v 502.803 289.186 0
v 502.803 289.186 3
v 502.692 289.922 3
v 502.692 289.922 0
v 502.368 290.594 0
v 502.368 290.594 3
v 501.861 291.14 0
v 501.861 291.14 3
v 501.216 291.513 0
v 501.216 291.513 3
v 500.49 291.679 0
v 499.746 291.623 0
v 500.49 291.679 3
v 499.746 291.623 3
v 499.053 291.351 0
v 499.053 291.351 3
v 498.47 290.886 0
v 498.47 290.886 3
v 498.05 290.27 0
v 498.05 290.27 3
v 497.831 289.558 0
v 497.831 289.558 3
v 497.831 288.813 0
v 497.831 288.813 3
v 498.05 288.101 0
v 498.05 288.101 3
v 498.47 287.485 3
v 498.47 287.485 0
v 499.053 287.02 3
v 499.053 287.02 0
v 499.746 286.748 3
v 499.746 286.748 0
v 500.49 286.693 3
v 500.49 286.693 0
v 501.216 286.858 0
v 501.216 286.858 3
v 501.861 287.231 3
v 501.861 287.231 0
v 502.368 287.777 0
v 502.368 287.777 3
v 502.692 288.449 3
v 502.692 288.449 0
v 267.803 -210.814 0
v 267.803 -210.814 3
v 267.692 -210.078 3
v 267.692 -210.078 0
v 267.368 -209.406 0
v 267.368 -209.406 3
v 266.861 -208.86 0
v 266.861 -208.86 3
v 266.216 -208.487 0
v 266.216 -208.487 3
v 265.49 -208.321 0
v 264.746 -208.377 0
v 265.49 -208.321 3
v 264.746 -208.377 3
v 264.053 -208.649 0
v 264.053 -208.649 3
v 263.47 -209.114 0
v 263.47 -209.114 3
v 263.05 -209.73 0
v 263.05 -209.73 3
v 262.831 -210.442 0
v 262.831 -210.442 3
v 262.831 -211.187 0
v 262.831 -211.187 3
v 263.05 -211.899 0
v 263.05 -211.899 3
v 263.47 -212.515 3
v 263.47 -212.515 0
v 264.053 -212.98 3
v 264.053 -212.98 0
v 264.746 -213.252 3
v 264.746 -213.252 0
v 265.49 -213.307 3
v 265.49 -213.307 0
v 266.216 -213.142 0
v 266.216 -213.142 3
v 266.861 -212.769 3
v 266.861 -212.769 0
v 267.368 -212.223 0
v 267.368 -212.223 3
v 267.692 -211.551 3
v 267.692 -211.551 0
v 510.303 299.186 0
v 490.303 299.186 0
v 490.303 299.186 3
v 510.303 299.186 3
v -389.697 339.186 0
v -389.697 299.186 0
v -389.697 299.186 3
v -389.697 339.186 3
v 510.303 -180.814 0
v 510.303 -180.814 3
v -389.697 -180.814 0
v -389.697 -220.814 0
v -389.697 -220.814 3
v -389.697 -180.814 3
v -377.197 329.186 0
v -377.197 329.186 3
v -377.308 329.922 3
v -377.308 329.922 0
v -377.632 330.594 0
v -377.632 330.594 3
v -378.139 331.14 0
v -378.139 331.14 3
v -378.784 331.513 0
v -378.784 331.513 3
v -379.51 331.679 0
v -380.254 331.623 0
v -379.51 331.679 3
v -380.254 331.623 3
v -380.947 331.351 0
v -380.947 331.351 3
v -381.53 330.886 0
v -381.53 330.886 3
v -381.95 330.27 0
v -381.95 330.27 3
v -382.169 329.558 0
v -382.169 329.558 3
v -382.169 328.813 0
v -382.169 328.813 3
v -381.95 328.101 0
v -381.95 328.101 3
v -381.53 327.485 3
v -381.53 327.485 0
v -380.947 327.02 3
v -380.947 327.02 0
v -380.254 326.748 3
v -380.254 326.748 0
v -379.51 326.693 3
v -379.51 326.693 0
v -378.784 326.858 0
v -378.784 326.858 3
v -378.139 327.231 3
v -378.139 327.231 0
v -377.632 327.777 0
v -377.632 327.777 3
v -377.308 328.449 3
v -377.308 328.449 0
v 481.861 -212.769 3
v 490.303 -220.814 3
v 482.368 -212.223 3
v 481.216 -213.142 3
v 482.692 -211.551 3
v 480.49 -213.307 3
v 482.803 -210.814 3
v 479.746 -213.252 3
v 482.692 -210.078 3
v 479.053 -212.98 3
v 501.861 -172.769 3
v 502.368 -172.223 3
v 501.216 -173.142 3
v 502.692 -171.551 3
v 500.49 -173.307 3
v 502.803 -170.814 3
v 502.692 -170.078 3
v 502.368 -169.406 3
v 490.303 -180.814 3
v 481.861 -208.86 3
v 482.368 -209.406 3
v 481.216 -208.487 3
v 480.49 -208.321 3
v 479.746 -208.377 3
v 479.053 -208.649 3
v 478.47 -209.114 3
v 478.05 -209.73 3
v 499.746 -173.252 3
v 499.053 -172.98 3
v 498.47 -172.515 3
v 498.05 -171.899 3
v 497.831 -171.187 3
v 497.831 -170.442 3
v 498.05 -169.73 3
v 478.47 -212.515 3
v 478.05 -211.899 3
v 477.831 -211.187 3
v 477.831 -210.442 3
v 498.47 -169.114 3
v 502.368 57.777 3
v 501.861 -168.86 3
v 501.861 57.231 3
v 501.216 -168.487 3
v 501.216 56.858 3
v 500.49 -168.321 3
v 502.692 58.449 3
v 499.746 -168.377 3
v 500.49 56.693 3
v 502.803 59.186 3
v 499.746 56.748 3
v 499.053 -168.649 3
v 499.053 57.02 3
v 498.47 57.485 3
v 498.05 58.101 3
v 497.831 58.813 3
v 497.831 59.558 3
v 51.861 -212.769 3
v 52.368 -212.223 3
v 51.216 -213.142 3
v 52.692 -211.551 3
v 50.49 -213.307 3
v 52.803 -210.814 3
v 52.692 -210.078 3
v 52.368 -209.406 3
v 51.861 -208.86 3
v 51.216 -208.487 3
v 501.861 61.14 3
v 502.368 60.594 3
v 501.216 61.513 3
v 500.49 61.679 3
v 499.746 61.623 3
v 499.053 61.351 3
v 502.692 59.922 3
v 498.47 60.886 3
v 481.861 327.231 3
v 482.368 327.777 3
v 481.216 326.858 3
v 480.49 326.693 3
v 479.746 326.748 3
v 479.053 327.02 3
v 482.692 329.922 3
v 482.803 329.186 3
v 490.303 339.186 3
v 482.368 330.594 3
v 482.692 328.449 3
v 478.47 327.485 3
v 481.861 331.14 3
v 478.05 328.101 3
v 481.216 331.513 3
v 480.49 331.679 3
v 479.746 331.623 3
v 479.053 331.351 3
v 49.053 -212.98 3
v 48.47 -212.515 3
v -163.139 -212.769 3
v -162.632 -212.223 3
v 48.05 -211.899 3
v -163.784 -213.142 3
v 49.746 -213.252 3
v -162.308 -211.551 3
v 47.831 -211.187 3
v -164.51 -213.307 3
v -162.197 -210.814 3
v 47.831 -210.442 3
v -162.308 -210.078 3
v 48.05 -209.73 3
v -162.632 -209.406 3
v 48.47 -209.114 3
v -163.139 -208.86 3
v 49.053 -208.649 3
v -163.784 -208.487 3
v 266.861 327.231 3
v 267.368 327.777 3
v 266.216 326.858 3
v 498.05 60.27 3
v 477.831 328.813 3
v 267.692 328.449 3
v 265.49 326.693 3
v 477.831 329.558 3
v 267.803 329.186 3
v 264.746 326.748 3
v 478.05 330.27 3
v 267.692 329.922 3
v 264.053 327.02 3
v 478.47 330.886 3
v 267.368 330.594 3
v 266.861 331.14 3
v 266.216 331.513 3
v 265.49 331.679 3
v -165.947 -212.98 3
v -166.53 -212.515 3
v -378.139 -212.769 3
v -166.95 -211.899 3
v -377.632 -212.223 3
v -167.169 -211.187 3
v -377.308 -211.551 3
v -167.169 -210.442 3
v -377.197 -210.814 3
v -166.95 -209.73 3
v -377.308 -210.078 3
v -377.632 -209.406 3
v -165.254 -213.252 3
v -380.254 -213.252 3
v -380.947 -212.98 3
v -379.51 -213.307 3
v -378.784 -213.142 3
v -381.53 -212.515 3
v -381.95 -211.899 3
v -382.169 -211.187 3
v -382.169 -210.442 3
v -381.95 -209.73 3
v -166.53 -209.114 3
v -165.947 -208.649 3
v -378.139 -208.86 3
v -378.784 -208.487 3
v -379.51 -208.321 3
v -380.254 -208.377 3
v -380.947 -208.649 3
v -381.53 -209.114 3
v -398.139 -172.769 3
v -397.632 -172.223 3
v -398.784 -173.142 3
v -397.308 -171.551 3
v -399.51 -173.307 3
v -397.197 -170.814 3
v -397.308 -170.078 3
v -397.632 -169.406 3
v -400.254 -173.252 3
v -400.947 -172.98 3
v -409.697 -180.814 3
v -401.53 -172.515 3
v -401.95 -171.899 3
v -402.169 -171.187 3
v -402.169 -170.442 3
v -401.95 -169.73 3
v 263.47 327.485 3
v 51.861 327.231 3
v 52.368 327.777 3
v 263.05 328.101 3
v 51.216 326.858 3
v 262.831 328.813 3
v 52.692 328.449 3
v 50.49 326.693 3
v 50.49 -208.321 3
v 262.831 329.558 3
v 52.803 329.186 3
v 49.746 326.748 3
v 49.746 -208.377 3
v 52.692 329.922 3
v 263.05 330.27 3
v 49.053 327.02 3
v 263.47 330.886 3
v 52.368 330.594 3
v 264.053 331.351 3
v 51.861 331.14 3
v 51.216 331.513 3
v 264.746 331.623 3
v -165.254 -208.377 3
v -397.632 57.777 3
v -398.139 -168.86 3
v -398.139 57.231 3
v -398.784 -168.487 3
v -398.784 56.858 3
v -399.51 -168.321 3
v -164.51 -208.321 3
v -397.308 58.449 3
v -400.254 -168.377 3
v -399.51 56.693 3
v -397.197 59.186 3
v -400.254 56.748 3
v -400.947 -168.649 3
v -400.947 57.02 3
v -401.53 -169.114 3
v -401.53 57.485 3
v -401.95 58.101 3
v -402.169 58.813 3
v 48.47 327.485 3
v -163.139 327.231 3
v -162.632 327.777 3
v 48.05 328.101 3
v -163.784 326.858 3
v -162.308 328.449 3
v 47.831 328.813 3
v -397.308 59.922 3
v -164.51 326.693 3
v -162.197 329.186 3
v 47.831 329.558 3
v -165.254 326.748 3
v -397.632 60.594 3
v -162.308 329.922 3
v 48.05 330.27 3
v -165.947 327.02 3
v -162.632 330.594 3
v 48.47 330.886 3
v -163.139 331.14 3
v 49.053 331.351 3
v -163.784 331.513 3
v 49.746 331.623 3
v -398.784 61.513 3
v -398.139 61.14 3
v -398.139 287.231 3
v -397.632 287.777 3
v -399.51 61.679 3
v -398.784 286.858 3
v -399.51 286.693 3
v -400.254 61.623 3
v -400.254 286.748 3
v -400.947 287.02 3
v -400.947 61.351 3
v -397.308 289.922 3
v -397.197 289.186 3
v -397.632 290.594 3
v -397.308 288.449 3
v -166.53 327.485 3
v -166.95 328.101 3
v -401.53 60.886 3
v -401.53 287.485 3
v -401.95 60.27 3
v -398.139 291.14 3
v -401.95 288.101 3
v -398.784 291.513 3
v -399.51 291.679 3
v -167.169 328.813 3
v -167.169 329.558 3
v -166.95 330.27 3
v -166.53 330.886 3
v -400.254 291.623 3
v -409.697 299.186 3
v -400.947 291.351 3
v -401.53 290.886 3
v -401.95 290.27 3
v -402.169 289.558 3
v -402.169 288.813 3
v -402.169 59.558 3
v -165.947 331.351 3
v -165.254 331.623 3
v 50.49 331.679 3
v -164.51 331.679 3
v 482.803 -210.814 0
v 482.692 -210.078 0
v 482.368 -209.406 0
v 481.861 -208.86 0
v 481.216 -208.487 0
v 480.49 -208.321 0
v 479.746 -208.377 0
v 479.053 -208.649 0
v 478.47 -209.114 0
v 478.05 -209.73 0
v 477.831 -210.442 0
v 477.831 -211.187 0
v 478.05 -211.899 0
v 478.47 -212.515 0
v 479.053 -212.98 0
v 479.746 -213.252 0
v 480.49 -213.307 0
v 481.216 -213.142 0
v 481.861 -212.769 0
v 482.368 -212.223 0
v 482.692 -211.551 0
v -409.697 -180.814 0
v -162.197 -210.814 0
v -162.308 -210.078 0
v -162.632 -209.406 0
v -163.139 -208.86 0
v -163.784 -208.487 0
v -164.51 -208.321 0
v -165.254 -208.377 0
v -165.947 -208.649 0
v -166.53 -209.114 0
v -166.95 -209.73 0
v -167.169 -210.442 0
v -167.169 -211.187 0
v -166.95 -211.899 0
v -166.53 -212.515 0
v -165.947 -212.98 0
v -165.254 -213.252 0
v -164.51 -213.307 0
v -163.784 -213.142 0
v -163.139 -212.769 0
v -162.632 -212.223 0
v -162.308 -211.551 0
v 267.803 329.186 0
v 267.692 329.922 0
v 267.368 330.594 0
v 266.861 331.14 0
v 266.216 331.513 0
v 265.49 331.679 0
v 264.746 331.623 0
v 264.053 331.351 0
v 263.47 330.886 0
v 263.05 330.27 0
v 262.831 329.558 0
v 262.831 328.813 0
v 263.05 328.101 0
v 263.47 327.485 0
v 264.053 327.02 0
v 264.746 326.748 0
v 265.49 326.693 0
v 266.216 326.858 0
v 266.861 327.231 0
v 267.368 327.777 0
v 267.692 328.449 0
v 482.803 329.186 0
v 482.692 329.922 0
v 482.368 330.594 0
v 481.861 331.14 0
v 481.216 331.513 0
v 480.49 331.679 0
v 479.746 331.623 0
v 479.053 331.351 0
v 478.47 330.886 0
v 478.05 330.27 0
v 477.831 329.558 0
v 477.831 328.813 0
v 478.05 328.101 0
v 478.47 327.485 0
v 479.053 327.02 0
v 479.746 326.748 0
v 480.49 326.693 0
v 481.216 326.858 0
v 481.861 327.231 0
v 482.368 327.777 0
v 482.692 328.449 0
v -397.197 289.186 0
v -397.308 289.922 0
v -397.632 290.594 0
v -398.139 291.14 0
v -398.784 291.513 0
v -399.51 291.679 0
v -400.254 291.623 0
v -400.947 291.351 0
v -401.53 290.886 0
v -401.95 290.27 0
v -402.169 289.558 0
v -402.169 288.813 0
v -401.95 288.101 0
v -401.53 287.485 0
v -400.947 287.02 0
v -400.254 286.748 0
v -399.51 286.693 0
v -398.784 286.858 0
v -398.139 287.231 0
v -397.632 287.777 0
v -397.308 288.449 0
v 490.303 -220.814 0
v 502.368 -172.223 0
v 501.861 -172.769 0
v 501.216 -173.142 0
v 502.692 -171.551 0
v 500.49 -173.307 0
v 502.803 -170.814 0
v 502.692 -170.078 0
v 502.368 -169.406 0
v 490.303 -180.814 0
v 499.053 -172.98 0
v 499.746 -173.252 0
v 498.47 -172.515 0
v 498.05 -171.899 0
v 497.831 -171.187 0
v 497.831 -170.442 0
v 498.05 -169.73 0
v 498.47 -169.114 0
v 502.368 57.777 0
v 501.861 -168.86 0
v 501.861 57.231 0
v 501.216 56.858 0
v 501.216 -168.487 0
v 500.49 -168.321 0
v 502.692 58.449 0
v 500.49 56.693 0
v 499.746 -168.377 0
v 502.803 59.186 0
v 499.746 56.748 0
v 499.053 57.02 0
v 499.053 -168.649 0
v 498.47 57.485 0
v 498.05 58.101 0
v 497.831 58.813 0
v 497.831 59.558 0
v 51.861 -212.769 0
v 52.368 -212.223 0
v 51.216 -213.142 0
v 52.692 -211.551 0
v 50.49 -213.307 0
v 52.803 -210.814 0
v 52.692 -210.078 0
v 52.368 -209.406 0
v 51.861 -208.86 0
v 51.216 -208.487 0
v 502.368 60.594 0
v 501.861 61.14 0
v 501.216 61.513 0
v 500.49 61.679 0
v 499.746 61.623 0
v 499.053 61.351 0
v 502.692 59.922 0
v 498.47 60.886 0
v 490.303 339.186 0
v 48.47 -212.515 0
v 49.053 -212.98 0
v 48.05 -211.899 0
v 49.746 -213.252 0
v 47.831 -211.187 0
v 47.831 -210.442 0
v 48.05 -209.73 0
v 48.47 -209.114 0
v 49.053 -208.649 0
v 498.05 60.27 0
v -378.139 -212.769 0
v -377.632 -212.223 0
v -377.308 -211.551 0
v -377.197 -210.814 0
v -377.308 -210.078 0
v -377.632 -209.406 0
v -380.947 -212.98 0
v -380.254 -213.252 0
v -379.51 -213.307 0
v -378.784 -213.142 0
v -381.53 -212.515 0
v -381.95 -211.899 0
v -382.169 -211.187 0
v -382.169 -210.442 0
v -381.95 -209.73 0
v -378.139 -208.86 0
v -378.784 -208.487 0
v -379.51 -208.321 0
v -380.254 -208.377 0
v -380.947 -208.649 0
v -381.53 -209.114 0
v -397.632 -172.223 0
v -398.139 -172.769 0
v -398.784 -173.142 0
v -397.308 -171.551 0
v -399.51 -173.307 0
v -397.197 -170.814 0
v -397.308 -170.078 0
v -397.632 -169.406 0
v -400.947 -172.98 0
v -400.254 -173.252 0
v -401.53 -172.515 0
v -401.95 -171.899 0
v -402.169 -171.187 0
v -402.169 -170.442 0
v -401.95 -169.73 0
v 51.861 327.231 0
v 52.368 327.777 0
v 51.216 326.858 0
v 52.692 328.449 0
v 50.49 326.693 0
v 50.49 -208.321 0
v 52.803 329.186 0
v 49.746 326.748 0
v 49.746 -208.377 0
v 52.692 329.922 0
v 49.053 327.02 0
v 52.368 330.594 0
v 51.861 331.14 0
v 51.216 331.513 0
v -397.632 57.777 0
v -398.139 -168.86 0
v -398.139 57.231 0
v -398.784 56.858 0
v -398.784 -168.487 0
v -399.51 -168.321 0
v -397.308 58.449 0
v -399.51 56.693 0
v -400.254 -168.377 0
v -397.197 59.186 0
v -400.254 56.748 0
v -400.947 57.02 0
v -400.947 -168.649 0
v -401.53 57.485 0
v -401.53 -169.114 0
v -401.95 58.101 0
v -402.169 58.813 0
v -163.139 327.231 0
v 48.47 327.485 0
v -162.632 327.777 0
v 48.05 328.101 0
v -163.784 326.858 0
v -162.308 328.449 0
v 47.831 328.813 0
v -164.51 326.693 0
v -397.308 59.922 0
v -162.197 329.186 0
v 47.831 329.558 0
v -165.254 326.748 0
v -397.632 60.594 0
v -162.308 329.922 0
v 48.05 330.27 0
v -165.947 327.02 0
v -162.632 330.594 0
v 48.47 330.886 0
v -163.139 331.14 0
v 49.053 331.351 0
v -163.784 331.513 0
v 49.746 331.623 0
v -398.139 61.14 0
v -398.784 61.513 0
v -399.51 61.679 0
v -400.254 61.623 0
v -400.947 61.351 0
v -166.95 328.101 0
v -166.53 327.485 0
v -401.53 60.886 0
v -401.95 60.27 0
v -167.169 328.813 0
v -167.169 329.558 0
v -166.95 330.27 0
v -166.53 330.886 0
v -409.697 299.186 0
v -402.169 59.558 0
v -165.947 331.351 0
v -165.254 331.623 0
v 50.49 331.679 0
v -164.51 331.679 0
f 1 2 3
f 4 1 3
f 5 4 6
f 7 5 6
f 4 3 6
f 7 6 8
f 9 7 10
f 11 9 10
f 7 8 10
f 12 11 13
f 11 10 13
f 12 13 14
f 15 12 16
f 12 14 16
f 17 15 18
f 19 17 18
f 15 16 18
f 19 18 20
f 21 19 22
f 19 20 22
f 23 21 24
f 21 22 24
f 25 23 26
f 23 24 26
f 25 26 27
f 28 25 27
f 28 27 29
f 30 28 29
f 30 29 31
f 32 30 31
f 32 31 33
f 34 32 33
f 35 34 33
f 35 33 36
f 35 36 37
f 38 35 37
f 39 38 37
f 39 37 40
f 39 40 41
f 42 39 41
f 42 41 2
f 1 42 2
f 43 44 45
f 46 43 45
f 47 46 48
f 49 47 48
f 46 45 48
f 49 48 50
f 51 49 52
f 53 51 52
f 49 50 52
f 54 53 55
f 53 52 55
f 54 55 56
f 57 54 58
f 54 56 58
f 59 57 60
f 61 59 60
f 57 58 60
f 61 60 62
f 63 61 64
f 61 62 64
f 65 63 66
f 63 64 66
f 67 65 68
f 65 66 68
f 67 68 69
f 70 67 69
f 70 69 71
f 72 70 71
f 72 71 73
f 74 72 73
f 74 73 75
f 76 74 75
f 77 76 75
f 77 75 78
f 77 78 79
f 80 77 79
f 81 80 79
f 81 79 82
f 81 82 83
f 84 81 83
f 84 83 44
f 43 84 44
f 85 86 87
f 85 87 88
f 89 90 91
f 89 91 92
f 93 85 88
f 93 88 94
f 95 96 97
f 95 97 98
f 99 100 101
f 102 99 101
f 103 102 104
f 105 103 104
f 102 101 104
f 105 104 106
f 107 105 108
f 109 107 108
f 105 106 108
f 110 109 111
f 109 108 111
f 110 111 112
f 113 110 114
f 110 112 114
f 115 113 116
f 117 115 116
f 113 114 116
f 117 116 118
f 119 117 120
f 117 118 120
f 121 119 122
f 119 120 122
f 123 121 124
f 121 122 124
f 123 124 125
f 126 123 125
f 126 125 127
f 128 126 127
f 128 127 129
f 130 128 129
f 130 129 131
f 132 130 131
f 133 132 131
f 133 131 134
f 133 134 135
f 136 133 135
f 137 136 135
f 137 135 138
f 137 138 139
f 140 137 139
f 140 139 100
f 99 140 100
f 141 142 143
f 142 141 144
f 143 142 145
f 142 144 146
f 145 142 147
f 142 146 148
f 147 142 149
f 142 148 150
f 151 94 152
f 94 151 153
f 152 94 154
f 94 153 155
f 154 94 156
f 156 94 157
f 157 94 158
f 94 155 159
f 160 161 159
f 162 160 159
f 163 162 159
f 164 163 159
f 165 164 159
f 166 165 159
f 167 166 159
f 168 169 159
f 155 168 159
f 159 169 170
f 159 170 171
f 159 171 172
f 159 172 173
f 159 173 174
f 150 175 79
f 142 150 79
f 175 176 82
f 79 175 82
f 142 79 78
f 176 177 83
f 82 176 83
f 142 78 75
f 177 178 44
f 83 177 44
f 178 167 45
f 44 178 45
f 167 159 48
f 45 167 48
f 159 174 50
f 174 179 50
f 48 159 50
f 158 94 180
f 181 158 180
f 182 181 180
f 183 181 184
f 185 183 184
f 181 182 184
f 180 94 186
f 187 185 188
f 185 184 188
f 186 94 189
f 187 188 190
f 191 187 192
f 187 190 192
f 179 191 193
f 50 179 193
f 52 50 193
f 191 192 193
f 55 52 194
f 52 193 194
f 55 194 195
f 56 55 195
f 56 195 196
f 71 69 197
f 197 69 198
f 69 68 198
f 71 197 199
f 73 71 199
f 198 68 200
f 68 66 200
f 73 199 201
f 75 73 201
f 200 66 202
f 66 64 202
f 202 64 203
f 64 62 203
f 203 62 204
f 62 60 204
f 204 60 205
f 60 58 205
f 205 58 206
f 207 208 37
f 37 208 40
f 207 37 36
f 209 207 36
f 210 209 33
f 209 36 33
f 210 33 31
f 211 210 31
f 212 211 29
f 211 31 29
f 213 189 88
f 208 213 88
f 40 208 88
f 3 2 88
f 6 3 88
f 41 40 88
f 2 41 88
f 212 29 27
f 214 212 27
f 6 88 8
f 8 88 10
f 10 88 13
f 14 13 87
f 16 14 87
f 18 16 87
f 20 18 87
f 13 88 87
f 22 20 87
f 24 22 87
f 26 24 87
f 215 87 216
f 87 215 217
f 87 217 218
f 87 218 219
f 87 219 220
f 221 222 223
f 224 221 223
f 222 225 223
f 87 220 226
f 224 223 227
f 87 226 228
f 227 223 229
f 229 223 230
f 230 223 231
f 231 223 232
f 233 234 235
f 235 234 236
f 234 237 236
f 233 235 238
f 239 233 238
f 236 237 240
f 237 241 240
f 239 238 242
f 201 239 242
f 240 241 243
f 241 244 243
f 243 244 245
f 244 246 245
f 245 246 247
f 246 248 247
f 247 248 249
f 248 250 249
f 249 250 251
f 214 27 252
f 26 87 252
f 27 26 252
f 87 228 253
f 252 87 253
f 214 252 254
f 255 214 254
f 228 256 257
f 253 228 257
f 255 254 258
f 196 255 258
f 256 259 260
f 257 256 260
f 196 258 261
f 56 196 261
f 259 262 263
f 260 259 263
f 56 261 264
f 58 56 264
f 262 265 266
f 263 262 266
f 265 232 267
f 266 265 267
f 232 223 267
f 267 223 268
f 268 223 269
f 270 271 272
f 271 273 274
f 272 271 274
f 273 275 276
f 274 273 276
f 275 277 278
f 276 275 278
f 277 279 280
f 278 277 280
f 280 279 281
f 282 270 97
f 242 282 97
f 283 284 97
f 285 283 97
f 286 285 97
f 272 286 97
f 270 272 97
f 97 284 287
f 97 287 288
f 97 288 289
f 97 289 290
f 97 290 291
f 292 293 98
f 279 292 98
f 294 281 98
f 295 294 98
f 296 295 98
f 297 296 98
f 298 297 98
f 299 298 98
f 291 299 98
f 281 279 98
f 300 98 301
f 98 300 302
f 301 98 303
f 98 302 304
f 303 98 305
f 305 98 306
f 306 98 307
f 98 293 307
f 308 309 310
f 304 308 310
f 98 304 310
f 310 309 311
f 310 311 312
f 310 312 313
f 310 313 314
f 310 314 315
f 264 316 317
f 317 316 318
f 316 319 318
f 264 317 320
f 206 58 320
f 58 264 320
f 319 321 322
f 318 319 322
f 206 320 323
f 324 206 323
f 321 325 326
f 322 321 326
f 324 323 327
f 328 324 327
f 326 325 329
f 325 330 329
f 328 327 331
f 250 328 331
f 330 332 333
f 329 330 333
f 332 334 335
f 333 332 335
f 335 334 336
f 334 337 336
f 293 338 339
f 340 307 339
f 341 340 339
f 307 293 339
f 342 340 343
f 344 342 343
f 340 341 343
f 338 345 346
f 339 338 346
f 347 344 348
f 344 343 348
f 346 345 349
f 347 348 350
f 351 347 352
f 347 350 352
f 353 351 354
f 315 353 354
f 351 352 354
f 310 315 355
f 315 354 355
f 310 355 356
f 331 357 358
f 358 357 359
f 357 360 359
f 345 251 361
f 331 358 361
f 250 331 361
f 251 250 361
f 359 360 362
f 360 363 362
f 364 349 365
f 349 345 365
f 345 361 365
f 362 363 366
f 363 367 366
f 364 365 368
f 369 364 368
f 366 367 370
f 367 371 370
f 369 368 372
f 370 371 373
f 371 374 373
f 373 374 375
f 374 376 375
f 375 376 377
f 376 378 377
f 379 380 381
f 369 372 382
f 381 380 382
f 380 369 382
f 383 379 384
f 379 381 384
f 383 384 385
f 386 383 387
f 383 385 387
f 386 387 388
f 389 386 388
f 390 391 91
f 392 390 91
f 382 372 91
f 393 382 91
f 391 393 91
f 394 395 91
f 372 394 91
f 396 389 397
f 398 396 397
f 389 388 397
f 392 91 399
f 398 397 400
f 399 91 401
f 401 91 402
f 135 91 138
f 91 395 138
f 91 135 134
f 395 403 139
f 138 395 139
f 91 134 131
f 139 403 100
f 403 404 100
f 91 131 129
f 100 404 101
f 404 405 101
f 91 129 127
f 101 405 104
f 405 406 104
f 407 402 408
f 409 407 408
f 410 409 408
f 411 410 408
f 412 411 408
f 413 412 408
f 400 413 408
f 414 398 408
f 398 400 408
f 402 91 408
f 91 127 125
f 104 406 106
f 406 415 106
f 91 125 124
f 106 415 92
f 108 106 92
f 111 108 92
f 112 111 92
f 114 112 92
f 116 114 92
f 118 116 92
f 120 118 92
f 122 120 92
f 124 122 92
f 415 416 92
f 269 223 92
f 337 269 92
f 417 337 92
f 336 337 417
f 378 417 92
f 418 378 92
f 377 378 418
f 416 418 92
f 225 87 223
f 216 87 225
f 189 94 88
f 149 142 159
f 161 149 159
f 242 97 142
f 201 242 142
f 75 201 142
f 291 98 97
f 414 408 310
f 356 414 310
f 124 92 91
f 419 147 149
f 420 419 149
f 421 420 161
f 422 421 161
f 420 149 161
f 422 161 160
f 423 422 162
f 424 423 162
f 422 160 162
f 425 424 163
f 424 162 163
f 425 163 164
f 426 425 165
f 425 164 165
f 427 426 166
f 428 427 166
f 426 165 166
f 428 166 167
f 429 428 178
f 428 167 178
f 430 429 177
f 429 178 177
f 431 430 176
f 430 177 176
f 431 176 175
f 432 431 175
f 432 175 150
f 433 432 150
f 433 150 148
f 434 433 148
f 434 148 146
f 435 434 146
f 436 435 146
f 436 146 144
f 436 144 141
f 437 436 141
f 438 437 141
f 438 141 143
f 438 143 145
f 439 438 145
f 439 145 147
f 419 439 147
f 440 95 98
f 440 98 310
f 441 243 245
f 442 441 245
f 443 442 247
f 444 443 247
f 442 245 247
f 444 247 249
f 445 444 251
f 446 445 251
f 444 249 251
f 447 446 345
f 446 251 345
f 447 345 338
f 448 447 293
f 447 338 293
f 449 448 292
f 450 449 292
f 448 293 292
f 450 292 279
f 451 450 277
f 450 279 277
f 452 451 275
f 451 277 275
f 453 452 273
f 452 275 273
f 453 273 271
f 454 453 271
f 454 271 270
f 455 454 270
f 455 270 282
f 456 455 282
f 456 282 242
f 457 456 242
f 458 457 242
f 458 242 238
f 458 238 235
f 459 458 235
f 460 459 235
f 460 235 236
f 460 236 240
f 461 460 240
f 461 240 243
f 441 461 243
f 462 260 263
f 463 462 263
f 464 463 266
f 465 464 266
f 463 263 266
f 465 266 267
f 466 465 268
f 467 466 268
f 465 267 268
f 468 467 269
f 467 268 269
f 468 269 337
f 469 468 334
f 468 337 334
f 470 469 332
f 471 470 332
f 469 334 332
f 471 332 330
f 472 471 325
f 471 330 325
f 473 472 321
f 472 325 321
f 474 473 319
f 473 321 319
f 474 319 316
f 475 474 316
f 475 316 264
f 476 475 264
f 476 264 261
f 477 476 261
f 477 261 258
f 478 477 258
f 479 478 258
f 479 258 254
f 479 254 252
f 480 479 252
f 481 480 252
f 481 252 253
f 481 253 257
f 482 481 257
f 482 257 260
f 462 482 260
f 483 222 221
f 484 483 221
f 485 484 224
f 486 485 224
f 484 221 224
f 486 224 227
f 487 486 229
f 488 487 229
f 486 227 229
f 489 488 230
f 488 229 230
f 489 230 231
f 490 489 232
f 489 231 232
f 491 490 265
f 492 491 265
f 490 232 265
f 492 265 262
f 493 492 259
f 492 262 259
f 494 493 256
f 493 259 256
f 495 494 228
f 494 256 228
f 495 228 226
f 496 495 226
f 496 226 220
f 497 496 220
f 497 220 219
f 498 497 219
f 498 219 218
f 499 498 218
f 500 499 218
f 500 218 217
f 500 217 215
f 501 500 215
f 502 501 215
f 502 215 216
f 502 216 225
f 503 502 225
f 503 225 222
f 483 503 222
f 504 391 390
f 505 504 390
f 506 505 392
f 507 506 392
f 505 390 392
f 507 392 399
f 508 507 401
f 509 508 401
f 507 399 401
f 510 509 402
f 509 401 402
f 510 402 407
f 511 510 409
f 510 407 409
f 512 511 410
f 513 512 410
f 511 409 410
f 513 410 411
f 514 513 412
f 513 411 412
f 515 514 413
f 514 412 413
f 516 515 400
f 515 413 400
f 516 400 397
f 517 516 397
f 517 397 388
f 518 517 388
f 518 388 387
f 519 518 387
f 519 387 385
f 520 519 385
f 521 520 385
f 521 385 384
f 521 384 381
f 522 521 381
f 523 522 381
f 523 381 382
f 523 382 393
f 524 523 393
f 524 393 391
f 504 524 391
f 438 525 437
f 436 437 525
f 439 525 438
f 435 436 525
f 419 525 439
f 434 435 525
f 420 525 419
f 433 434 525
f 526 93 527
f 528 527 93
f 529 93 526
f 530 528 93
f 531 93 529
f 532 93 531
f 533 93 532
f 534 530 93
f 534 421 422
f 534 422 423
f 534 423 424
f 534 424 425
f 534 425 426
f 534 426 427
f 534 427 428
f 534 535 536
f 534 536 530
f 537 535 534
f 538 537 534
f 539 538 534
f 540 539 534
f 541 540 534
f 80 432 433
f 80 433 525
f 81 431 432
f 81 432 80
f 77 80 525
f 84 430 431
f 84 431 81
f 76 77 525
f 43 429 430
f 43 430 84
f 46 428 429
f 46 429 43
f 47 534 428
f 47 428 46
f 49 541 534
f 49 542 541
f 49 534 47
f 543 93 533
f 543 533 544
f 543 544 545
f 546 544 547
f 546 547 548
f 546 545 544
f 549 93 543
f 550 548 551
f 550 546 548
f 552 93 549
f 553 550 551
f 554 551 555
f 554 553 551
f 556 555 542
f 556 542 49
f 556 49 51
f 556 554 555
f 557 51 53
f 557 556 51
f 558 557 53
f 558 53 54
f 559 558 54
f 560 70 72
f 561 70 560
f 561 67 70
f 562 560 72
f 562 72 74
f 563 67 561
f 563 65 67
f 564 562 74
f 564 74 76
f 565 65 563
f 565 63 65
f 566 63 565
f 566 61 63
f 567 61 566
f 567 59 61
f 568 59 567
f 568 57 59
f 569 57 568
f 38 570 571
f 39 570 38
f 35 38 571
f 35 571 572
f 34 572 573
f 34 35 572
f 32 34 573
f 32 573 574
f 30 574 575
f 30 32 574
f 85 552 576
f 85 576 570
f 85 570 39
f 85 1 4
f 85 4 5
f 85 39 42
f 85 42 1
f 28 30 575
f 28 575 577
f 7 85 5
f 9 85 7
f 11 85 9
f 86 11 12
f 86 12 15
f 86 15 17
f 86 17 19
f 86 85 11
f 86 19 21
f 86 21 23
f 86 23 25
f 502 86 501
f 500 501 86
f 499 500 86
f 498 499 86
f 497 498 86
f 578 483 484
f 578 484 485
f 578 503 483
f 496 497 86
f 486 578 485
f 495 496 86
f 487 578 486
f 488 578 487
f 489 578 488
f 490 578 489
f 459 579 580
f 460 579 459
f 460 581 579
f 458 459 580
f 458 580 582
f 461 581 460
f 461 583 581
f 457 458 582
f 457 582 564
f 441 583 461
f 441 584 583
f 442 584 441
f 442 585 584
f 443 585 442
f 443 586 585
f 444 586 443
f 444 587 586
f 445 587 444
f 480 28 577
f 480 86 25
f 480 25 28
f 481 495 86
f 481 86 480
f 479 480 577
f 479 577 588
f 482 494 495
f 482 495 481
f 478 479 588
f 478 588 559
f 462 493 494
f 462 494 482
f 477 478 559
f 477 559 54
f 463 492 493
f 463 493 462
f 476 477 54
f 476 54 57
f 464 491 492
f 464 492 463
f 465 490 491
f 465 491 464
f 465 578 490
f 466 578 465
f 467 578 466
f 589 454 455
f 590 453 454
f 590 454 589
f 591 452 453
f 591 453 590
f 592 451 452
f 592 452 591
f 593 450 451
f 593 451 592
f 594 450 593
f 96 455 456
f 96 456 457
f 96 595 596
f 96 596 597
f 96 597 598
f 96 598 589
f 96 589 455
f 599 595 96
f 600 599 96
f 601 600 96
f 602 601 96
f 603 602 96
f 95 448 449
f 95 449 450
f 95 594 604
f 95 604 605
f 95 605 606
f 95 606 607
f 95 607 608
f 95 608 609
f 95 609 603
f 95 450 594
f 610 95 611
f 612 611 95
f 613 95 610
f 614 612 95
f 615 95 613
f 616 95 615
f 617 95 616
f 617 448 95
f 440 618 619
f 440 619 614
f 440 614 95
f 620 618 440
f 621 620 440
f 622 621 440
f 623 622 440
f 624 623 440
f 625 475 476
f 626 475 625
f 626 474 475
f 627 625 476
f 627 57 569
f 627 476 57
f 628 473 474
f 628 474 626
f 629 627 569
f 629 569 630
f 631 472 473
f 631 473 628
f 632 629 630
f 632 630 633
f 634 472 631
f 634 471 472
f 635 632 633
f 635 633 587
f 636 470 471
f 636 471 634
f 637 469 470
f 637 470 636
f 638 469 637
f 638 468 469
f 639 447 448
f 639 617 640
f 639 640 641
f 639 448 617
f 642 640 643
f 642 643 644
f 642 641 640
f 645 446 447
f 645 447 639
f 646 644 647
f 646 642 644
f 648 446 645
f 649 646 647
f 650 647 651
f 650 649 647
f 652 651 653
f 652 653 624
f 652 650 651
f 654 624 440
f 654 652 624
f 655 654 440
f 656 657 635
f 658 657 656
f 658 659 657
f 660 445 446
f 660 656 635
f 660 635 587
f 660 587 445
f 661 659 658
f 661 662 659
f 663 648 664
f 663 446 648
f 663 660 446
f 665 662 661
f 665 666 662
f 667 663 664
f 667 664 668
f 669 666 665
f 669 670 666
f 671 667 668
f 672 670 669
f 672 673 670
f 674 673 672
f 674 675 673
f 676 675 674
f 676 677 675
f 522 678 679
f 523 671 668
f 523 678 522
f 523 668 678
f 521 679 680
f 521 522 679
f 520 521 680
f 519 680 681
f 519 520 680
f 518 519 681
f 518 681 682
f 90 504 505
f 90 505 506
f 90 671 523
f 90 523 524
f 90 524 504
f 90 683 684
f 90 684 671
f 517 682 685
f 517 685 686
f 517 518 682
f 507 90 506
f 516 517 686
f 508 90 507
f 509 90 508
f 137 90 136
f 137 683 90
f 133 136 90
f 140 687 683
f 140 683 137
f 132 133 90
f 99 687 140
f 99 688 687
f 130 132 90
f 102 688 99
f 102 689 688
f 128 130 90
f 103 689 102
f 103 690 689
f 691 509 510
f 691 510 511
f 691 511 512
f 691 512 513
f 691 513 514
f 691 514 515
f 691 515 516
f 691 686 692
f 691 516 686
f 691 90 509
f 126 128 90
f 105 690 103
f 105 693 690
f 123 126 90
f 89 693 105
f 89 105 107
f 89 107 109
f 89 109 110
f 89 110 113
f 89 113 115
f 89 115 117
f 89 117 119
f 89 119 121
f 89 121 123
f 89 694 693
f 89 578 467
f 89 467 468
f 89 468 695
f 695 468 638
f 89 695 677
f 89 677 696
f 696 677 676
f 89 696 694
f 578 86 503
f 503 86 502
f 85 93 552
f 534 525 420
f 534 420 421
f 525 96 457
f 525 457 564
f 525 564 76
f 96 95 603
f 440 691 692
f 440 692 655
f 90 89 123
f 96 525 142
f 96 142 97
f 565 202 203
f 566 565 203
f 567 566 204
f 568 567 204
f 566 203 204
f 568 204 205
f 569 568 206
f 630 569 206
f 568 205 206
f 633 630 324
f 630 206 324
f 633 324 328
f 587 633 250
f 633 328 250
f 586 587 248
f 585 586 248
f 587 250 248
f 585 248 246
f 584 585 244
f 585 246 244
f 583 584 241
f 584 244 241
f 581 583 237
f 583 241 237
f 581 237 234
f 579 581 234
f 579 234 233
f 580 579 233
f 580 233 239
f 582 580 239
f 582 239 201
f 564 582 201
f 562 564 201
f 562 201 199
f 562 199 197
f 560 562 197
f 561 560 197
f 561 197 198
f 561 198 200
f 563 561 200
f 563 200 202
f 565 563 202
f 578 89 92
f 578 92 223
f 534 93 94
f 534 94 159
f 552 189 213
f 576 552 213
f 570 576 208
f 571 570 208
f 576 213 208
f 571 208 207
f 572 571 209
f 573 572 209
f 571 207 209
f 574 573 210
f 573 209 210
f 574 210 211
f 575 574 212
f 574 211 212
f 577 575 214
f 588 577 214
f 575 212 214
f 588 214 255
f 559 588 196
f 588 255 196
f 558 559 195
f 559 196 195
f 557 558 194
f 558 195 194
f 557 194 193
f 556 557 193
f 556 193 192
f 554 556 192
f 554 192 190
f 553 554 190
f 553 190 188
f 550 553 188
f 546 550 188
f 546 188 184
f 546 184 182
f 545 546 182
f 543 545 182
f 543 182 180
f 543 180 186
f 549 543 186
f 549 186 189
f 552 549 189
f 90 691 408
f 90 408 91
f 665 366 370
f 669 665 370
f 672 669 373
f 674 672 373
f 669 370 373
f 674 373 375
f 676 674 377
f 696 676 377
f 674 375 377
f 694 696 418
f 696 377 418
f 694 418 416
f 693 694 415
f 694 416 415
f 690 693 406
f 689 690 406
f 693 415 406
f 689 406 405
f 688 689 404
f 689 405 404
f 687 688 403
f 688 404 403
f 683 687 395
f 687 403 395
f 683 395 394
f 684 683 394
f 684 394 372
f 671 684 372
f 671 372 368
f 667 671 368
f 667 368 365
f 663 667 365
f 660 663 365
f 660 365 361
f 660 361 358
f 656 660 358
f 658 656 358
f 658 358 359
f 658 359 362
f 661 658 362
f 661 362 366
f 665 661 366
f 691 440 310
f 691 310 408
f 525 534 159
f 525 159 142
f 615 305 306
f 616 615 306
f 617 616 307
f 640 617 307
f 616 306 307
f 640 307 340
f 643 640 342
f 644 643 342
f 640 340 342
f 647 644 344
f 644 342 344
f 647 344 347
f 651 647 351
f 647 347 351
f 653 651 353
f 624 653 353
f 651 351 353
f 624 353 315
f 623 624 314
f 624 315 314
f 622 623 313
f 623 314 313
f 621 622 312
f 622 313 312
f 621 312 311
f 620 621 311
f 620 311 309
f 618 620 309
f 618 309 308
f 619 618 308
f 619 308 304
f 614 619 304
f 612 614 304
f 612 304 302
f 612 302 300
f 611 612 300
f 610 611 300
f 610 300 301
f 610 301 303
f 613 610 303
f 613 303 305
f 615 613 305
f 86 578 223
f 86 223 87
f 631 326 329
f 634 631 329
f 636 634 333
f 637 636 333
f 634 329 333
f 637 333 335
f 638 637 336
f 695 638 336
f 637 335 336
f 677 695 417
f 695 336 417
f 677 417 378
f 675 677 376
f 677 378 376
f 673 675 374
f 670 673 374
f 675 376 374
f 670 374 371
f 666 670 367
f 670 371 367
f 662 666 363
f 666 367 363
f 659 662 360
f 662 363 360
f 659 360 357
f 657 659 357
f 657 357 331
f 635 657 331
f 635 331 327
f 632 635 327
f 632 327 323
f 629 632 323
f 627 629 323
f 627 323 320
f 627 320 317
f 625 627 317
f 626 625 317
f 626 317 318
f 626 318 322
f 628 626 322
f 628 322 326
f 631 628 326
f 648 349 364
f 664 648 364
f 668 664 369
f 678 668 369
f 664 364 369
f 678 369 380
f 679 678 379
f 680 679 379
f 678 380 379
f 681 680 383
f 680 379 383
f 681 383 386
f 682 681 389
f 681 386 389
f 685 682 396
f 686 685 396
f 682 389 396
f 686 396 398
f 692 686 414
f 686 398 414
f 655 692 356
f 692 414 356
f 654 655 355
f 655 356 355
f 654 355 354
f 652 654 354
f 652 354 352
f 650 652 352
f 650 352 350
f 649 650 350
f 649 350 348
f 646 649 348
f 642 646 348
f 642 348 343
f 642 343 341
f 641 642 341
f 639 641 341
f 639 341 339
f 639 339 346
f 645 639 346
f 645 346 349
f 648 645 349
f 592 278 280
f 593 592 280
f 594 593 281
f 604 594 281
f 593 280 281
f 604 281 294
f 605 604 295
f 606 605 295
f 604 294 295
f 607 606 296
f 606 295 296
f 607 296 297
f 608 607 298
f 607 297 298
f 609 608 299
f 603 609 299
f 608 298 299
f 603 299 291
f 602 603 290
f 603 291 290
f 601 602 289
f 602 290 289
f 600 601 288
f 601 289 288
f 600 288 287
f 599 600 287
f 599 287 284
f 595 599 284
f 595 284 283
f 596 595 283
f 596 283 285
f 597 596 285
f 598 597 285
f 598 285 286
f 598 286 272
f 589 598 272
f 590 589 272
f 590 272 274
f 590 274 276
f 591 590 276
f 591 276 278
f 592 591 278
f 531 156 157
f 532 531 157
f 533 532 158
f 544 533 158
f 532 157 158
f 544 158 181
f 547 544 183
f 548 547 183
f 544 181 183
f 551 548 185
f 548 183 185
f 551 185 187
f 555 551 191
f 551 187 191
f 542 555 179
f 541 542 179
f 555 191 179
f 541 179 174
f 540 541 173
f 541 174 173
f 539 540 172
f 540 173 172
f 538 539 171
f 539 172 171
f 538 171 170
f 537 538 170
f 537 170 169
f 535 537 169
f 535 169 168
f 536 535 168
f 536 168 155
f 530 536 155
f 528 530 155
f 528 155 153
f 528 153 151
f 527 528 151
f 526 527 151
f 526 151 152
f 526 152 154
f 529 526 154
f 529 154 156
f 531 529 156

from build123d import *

# Parameters (mm, degrees)
BOSS_EXTRUDE1_DEPTH = 3
SKETCH2_R           = 2.5
CUT_EXTRUDE1_DEPTH  = 613.75171356


with BuildPart() as part:
    # Sketch1 → Boss-Extrude1 (new body)
    with BuildSketch(Plane.XY):
        Polygon((-389.697293258, 339.185509658), (490.302706742, 339.185509658), (490.302706742, 299.185509658), (510.302706742, 299.185509658), (510.302706742, -180.814490342), (490.302706742, -180.814490342), (490.302706742, -220.814490342), (-389.697293258, -220.814490342), (-389.697293258, -180.814490342), (-409.697293258, -180.814490342), (-409.697293258, 299.185509658), (-389.697293258, 299.185509658), align=None)
    extrude(amount=BOSS_EXTRUDE1_DEPTH)

    # Sketch2 → Cut-Extrude1 (cut, through all)
    with BuildSketch(Plane.XY.offset(3)):
        with Locations((-379.697293258, 329.185509658)):
            Circle(SKETCH2_R)
        with Locations((480.302706742, 329.185509658)):
            Circle(SKETCH2_R)
        with Locations((-164.697293258, 329.185509658)):
            Circle(SKETCH2_R)
        with Locations((50.302706742, 329.185509658)):
            Circle(SKETCH2_R)
        with Locations((265.302706742, 329.185509658)):
            Circle(SKETCH2_R)
        with Locations((-379.697293258, -210.814490342)):
            Circle(SKETCH2_R)
        with Locations((480.302706742, -210.814490342)):
            Circle(SKETCH2_R)
        with Locations((265.302706742, -210.814490342)):
            Circle(SKETCH2_R)
        with Locations((50.302706742, -210.814490342)):
            Circle(SKETCH2_R)
        with Locations((-164.697293258, -210.814490342)):
            Circle(SKETCH2_R)
        with Locations((-399.697293258, 289.185509658)):
            Circle(SKETCH2_R)
        with Locations((-399.697293258, -170.814490342)):
            Circle(SKETCH2_R)
        with Locations((-399.697293258, 59.185509658)):
            Circle(SKETCH2_R)
        with Locations((500.302706742, 289.185509658)):
            Circle(SKETCH2_R)
        with Locations((500.302706742, 59.185509658)):
            Circle(SKETCH2_R)
        with Locations((500.302706742, -170.814490342)):
            Circle(SKETCH2_R)
    extrude(amount=-CUT_EXTRUDE1_DEPTH, mode=Mode.SUBTRACT)


solid = part.part
